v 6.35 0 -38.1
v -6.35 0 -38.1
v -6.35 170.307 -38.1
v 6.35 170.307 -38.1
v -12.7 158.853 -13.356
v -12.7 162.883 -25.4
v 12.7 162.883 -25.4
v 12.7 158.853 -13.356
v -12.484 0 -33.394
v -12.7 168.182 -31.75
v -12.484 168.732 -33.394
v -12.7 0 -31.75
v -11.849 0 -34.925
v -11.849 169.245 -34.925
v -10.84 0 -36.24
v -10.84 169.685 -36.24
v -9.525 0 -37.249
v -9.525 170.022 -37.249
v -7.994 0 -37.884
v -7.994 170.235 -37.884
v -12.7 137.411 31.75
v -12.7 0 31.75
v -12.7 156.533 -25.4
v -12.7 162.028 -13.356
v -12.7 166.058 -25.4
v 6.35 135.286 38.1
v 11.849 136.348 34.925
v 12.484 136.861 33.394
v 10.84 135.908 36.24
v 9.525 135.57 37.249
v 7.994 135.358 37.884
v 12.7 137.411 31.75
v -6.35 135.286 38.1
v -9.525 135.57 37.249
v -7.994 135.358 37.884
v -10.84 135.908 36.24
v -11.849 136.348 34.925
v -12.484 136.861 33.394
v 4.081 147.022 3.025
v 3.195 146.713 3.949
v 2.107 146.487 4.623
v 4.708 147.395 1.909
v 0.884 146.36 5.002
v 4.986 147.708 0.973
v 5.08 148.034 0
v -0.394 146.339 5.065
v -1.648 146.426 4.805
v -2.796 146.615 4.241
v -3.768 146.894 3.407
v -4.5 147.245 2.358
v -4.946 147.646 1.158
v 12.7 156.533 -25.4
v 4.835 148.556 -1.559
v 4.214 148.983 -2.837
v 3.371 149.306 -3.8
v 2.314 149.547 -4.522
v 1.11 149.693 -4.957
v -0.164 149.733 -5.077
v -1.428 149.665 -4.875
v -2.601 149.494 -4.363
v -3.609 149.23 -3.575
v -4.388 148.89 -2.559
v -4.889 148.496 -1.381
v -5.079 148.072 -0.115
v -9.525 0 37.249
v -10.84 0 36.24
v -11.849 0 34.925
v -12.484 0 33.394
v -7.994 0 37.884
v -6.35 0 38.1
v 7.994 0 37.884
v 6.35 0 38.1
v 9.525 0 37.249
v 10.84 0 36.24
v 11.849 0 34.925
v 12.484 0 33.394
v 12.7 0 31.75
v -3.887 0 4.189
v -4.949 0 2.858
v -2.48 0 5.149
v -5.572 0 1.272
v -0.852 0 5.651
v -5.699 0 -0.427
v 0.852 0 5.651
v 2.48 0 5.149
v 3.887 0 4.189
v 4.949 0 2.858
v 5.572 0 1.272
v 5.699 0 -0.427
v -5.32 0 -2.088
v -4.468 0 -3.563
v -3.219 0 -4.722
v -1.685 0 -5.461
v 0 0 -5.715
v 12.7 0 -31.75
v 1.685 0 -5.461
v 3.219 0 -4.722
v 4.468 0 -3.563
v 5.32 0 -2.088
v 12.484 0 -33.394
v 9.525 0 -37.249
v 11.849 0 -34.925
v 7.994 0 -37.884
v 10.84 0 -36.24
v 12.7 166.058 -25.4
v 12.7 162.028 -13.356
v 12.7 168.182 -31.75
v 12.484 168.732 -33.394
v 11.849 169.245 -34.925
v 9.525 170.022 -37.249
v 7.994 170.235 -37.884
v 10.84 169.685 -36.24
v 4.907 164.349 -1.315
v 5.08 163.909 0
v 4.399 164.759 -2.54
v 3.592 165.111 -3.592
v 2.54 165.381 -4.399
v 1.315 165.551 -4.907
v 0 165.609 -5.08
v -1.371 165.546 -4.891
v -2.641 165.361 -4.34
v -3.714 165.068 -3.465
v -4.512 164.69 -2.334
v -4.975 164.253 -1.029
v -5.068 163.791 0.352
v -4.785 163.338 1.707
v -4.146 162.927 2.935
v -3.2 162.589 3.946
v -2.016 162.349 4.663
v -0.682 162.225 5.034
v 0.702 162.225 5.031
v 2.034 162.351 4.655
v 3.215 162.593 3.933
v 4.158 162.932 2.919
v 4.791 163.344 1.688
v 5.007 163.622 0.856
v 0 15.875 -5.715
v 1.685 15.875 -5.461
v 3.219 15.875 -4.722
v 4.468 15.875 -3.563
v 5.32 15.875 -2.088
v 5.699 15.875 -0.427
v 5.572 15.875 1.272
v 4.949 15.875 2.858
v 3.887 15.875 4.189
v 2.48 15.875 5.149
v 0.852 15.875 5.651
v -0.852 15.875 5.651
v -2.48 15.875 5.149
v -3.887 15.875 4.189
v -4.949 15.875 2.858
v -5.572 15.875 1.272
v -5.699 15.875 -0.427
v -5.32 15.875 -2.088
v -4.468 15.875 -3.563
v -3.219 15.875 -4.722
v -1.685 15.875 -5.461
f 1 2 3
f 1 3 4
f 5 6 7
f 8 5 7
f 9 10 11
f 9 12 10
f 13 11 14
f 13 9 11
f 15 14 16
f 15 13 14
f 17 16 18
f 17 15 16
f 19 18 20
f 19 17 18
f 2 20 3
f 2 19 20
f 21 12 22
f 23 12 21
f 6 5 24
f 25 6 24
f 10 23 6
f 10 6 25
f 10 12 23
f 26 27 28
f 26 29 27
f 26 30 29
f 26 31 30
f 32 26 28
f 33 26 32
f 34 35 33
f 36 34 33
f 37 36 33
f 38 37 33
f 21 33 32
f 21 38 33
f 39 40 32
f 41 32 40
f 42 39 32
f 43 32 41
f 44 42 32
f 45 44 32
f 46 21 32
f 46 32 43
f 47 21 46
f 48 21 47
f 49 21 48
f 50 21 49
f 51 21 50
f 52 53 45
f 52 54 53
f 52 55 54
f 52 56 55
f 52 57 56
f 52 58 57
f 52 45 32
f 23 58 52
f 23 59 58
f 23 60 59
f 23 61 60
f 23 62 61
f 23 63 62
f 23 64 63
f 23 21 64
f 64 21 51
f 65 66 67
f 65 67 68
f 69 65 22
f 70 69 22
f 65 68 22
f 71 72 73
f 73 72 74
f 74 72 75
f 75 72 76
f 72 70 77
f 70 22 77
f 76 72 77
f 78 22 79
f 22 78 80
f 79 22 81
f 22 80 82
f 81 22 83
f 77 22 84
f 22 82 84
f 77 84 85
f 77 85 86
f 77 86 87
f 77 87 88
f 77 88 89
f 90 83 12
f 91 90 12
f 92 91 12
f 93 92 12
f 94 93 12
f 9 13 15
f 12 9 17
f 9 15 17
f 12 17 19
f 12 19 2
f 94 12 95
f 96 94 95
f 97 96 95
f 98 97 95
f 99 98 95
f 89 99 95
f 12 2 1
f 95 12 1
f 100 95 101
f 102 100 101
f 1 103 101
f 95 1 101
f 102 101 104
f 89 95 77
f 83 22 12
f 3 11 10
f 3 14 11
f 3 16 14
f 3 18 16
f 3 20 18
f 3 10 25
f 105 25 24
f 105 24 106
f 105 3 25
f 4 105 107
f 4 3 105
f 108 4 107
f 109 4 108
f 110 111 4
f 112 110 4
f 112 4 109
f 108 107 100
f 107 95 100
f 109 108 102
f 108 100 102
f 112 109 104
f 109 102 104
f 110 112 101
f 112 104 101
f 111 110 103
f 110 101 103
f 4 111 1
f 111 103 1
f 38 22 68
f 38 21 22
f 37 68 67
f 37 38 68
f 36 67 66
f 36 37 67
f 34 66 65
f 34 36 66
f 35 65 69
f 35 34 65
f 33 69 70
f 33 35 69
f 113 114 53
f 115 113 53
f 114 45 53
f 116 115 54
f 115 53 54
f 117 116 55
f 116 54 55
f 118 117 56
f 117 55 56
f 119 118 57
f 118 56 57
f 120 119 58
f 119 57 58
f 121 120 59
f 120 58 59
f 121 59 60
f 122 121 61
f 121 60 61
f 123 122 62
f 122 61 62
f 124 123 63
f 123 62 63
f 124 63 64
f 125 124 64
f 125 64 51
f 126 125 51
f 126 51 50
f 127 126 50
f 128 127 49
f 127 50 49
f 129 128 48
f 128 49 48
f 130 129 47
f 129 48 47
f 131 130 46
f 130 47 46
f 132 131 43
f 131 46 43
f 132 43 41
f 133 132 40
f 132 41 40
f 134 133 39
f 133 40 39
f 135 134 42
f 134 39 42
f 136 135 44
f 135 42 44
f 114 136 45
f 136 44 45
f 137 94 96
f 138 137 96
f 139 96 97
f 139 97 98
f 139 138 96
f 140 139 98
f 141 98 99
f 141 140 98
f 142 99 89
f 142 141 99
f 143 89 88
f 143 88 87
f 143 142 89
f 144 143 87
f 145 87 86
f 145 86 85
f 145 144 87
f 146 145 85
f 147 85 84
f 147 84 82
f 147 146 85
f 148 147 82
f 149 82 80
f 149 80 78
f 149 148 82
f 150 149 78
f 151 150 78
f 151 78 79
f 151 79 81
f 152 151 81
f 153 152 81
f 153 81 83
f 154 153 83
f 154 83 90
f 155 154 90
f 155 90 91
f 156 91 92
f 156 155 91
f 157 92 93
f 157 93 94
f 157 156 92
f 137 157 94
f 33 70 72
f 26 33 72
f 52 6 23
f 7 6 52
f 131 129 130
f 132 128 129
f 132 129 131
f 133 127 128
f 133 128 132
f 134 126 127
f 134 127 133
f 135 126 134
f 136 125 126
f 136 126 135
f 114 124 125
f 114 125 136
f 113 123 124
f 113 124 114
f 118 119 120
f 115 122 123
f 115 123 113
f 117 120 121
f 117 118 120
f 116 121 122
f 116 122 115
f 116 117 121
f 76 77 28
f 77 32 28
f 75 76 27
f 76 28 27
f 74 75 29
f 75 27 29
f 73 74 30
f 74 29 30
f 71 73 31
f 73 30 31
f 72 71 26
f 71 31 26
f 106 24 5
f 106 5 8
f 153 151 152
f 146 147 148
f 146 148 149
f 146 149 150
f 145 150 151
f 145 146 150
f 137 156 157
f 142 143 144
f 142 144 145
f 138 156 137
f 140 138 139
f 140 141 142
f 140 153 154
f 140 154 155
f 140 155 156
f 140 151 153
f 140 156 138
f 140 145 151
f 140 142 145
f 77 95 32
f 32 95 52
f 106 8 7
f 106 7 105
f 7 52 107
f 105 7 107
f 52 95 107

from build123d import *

# Parameters (mm, degrees)
SKETCH1_W               = 25.4
SKETCH1_H               = 76.2
BOSS_EXTRUDE1_DEPTH     = 160.782
CUT_EXTRUDE2_DEPTH      = 168.175421411
CUT_EXTRUDE2_DEPTH_BACK = 168.175421411
BOSS_EXTRUDE2_REACH     = 177.247
SKETCH1_5_W             = 25.4
SKETCH1_5_H             = 12.7
SKETCH8_W               = 25.4
SKETCH8_H               = 3.175
BOSS_EXTRUDE3_DEPTH     = 12.7
FILLET1_R               = 6.35
BOSS_EXTRUDE4_REACH     = 192.853
SKETCH9_R               = 5.08
SKETCH9_3_R             = 5.715
CUT_EXTRUDE5_DEPTH      = 15.875


with BuildPart() as part:
    # Sketch1 → Boss-Extrude1 (new body)
    with BuildSketch(Plane(origin=(0, 0, 0), x_dir=(1, 0, 0), z_dir=(0, 1, 0))):
        Rectangle(SKETCH1_W, SKETCH1_H)
    extrude(amount=BOSS_EXTRUDE1_DEPTH)

    # Sketch4 → Cut-Extrude2 (cut, two sides: drawn at the far end of the back side and taken through both)
    with BuildSketch(Plane(origin=(12.7, 0, 0), x_dir=(0, 0, -1), z_dir=(1, 0, 0)).offset(-CUT_EXTRUDE2_DEPTH_BACK)):
        Polygon((38.1, 160.782), (-38.1, 160.782), (-38.1, 135.285836654), align=None)
    extrude(amount=CUT_EXTRUDE2_DEPTH + CUT_EXTRUDE2_DEPTH_BACK, mode=Mode.SUBTRACT)

    # Boss-Extrude2: from a plane face, 177.247 long prism both ways, kept between that surface and its translate by the depth
    boss_extrude2_start = Plane(origin=(-12.7, 135.285836654, 38.1), z_dir=(0, -0.9483236552061991, -0.31730465640509276)) * Box(710.988, 710.988, 355.494, align=(Align.CENTER, Align.CENTER, Align.MIN), mode=Mode.PRIVATE)
    boss_extrude2_end = Plane(origin=(-12.7, 144.810836654, 38.1), z_dir=(0, -0.9483236552061991, -0.31730465640509276)) * Box(710.988, 710.988, 355.494, align=(Align.CENTER, Align.CENTER, Align.MIN), mode=Mode.PRIVATE)
    # Sketch1<5> → Boss-Extrude2 (add, from a surface)
    with BuildSketch(Plane(origin=(0, 0, 0), x_dir=(1, 0, 0), z_dir=(0, 1, 0)), mode=Mode.PRIVATE) as boss_extrude2_sk1:
        with Locations((0, 31.75)):
            Rectangle(SKETCH1_5_W, SKETCH1_5_H)
    boss_extrude2_tool1 = extrude(boss_extrude2_sk1.sketch, amount=BOSS_EXTRUDE2_REACH, both=True, mode=Mode.PRIVATE)
    add(((boss_extrude2_tool1 - boss_extrude2_start) & boss_extrude2_end).solids().sort_by_distance((-3.175, 151.220939, -9.525))[0])

    # Sketch8 → Boss-Extrude3 (add, along a direction that is not the sketch's normal)
    with BuildSketch(Plane.XY.offset(-25.4)):
        with Locations((0, 164.470139442)):
            Rectangle(SKETCH8_W, SKETCH8_H)
    extrude(amount=BOSS_EXTRUDE3_DEPTH, dir=(0, -0.31730465640509276, 0.9483236552061991))

    # Fillet1
    fillet1_edges = [part.edges().sort_by_distance(p)[0] for p in [
        (-12.7, 85.1535, -38.1),
        (12.7, 85.1535, -38.1),
        (-12.7, 67.642918327, 38.1),
        (12.7, 67.642918327, 38.1),
    ]]
    fillet(fillet1_edges, radius=FILLET1_R)

    # Boss-Extrude4: from a plane face, 192.853 long prism both ways, kept between that surface and its translate by the depth
    boss_extrude4_start = Plane(origin=(-12.7, 135.285836654, 38.1), z_dir=(0, -0.9483236552061991, -0.31730465640509276)) * Box(773.412, 773.412, 386.706, align=(Align.CENTER, Align.CENTER, Align.MIN), mode=Mode.PRIVATE)
    boss_extrude4_end = Plane(origin=(-12.7, 151.160836654, 38.1), z_dir=(0, -0.9483236552061991, -0.31730465640509276)) * Box(773.412, 773.412, 386.706, align=(Align.CENTER, Align.CENTER, Align.MIN), mode=Mode.PRIVATE)
    # Sketch9 → Boss-Extrude4 (add, from a surface)
    with BuildSketch(Plane.XZ, mode=Mode.PRIVATE) as boss_extrude4_sk1:
        Circle(SKETCH9_R)
    boss_extrude4_tool1 = extrude(boss_extrude4_sk1.sketch, amount=BOSS_EXTRUDE4_REACH, both=True, mode=Mode.PRIVATE)
    add(((boss_extrude4_tool1 - boss_extrude4_start) & boss_extrude4_end).solids().sort_by_distance((0, 144.523163, 10.492543))[0])

    # Sketch9<3> → Cut-Extrude5 (cut)
    with BuildSketch(Plane.XZ):
        Circle(SKETCH9_3_R)
    extrude(amount=-CUT_EXTRUDE5_DEPTH, mode=Mode.SUBTRACT)


solid = part.part
